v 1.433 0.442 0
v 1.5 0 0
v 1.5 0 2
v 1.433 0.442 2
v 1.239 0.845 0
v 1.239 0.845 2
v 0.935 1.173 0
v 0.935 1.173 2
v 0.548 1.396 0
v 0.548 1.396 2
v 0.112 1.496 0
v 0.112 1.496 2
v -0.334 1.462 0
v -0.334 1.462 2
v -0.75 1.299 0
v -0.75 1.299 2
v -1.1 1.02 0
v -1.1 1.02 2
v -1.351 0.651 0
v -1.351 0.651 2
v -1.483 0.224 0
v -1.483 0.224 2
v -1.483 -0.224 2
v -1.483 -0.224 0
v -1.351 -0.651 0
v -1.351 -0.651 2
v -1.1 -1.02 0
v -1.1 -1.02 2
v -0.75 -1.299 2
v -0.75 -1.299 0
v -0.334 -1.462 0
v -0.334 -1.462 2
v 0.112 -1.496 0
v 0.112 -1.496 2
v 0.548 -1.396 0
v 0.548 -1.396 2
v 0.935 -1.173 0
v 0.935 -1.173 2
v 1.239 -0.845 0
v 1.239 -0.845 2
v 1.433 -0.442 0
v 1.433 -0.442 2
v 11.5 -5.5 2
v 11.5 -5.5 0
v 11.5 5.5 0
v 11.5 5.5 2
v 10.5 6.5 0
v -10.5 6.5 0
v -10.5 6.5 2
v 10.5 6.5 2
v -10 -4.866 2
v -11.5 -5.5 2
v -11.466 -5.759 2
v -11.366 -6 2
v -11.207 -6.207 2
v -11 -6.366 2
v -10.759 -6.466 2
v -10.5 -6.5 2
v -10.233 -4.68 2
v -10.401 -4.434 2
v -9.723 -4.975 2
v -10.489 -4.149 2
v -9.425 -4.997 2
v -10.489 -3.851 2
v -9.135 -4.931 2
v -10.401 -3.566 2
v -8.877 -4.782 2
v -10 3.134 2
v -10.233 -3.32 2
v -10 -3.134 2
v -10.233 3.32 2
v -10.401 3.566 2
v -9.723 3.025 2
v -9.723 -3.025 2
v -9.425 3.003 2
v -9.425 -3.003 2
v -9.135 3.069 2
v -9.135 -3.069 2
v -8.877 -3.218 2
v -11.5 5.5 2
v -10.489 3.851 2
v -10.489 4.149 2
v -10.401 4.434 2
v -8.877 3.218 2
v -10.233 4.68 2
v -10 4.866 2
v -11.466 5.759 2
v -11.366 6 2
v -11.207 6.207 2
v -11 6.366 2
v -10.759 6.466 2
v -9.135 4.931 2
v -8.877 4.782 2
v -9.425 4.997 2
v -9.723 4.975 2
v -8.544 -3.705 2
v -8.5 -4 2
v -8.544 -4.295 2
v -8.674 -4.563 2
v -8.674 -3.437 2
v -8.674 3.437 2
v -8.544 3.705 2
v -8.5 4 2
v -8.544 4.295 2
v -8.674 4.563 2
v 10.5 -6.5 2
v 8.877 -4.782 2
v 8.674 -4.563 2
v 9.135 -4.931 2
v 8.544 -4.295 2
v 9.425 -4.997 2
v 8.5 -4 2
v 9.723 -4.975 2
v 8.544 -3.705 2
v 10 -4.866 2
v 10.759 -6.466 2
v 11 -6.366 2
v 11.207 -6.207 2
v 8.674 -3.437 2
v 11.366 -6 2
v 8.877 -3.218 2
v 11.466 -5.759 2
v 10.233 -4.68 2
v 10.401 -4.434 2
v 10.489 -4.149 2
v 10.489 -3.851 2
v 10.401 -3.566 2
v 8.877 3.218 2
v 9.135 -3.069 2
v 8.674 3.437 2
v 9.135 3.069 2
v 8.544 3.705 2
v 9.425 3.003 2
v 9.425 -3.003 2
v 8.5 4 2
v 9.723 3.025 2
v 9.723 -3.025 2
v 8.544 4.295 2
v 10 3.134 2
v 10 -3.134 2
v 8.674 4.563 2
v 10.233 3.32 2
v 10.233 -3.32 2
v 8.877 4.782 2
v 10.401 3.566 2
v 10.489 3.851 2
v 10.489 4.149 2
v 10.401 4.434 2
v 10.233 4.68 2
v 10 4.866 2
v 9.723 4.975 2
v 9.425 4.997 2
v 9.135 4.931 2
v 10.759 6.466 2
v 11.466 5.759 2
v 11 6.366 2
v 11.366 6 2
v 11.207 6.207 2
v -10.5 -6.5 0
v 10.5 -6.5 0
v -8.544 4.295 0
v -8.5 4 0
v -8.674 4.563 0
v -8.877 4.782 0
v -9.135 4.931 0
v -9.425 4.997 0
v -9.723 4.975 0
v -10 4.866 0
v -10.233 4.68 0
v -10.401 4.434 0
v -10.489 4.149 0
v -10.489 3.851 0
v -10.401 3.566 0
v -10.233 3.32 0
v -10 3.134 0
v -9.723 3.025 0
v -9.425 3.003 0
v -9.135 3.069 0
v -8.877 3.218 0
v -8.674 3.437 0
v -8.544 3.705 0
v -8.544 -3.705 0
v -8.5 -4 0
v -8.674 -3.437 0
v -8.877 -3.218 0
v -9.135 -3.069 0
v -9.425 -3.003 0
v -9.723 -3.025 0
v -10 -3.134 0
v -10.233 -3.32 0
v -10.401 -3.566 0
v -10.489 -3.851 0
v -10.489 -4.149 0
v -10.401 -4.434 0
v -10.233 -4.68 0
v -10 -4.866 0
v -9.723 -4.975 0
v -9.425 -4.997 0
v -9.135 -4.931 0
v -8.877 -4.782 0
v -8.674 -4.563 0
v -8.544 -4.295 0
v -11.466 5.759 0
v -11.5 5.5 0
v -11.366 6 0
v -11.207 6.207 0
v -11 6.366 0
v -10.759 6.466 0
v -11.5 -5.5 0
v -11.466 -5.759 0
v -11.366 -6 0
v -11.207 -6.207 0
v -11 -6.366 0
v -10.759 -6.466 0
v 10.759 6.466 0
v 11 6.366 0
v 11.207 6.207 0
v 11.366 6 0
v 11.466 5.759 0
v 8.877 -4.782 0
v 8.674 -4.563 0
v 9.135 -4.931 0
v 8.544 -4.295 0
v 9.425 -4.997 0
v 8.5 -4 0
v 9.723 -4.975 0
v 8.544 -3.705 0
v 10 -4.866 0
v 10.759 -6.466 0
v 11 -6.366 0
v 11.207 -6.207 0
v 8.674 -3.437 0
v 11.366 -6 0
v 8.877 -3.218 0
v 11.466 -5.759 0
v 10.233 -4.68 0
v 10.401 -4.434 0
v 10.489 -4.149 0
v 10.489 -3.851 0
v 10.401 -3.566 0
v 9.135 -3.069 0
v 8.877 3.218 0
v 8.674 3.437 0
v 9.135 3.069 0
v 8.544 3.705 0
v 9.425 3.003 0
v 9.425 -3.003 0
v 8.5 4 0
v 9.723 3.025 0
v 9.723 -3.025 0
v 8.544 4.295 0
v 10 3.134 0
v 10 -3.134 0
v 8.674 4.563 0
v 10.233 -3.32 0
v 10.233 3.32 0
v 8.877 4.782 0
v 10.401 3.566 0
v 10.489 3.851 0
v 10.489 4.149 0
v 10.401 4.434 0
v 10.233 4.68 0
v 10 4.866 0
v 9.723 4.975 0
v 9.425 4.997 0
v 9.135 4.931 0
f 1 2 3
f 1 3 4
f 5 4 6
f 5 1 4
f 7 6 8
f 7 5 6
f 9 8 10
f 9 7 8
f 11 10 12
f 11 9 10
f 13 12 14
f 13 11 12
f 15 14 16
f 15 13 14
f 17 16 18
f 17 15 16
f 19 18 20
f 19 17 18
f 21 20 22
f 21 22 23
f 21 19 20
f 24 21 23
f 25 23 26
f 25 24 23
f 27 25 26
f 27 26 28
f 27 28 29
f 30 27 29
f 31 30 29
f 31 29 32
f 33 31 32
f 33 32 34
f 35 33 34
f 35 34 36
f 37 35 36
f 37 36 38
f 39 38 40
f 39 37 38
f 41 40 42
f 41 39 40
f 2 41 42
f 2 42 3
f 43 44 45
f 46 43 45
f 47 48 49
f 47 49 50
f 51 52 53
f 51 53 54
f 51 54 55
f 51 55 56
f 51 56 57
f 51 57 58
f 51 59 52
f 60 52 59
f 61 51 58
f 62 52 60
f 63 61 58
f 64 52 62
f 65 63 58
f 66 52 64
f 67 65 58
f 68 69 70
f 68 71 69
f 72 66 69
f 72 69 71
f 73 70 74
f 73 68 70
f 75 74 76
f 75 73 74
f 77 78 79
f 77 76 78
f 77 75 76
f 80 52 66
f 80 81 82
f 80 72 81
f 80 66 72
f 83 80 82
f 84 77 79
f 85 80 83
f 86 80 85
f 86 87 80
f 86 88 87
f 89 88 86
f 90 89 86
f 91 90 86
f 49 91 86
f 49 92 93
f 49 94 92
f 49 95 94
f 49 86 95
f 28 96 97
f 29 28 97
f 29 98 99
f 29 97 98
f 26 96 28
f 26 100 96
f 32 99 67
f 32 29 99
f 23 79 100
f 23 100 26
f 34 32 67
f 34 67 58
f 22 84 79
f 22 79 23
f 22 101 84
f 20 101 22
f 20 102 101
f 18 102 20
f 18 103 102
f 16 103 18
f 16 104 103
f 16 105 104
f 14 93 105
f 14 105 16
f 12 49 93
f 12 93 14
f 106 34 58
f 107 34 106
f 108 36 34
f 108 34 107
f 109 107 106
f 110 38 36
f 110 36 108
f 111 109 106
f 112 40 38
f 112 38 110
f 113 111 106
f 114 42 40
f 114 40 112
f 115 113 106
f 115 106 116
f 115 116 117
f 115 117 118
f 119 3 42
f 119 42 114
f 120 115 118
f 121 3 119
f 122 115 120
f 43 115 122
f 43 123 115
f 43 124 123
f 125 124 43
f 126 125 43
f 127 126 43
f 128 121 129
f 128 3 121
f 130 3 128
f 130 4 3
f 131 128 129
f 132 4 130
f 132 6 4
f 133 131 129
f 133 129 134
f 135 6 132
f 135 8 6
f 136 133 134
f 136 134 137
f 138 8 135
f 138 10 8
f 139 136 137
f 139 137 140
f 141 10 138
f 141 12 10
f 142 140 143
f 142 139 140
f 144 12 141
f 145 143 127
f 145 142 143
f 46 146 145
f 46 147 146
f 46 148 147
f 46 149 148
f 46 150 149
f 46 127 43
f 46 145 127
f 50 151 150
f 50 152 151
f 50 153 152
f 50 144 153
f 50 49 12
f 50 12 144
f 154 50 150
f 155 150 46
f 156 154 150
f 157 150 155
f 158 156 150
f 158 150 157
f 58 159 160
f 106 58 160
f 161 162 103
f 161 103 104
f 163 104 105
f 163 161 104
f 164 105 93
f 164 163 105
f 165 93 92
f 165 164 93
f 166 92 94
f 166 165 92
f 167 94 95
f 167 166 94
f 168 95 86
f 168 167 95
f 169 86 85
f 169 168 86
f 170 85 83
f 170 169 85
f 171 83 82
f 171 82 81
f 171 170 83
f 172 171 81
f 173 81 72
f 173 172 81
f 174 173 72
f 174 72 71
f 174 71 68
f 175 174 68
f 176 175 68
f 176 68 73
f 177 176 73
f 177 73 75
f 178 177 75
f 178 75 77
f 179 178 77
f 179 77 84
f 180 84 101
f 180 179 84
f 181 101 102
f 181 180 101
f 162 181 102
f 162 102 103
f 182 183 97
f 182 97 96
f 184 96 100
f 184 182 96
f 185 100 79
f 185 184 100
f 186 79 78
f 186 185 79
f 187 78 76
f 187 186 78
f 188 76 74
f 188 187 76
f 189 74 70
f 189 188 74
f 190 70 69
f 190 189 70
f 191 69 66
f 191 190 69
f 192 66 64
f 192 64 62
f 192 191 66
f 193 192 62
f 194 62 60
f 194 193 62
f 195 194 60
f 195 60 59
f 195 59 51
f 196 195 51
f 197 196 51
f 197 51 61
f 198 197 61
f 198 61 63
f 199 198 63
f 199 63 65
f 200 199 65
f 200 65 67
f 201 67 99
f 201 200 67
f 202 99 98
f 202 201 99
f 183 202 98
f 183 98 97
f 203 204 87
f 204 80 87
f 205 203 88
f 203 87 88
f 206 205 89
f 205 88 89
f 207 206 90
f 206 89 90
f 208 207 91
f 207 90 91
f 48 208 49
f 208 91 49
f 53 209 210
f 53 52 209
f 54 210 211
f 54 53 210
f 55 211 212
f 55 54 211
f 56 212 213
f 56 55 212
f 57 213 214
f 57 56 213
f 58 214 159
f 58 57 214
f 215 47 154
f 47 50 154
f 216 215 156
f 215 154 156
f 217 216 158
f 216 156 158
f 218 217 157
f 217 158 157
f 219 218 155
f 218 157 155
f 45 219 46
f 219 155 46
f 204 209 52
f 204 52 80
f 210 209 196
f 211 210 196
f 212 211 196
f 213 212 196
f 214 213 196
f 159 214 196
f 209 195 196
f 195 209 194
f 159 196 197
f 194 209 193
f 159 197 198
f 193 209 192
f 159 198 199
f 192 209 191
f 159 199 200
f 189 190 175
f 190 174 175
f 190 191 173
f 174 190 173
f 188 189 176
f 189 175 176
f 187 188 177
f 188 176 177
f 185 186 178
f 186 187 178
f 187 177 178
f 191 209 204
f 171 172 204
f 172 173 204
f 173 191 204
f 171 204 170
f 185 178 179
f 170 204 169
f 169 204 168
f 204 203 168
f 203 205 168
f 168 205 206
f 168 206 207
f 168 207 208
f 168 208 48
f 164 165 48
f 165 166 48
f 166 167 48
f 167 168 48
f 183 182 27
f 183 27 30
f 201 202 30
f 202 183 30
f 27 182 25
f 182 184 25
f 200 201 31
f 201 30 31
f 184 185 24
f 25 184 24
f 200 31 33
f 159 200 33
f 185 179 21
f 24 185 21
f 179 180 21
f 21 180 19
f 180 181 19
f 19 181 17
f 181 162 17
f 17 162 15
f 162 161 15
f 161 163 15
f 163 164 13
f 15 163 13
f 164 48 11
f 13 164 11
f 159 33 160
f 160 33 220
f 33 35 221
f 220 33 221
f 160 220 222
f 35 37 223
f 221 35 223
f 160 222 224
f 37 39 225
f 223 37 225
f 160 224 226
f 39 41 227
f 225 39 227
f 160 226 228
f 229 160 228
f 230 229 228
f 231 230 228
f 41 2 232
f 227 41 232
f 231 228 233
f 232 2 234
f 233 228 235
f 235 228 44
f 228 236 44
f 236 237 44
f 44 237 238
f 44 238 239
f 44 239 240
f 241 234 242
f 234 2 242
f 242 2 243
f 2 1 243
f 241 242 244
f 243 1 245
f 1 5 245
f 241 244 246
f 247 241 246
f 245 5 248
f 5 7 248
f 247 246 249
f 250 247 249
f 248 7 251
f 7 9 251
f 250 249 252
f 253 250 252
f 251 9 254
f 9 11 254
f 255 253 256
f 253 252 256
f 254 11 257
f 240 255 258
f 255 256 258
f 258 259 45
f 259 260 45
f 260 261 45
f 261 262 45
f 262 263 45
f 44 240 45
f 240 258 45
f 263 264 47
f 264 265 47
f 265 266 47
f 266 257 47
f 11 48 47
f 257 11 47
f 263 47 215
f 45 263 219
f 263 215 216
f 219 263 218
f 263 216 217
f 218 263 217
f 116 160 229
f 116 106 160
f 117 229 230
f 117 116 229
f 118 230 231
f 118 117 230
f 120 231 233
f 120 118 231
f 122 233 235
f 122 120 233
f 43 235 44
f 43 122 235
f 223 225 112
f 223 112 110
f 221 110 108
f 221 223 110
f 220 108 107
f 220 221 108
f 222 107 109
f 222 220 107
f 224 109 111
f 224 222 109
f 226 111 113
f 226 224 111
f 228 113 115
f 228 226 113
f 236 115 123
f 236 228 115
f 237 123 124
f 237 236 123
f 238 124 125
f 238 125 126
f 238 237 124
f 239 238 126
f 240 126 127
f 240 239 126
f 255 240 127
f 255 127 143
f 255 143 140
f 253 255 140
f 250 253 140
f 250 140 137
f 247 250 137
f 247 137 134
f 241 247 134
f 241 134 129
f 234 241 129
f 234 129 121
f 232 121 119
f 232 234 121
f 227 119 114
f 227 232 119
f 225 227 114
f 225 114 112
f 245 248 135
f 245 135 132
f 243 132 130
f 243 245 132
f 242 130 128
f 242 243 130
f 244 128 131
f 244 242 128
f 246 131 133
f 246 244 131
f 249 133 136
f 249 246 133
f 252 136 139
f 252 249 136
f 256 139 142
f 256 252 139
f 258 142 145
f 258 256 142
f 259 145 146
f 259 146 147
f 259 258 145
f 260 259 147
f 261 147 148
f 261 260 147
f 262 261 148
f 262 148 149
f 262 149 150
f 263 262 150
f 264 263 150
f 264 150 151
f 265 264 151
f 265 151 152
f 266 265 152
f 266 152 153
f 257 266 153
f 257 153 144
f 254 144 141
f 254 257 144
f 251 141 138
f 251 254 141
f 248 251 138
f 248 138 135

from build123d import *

# Parameters (mm, degrees)
SKETCH_1_W      = 23
SKETCH_1_H      = 13
SKETCH_1_R      = 1
SKETCH_1_R_2    = 1.5
EXTRUDE_1_DEPTH = 2
FILLET_1_R      = 1


with BuildPart() as part:
    # 草图1 → 凸台-拉伸1 (new body)
    with BuildSketch(Plane.XY):
        Rectangle(SKETCH_1_W, SKETCH_1_H)
        with Locations((-9.5, 4)):
            Circle(SKETCH_1_R, mode=Mode.SUBTRACT)
        with Locations((-9.5, -4)):
            Circle(SKETCH_1_R, mode=Mode.SUBTRACT)
        with Locations(Location((9.5, -4, 0), (0, 0, 180))):
            Circle(SKETCH_1_R, mode=Mode.SUBTRACT)
        with Locations(Location((9.5, 4, 0), (0, 0, 180))):
            Circle(SKETCH_1_R, mode=Mode.SUBTRACT)
        Circle(SKETCH_1_R_2, mode=Mode.SUBTRACT)
    extrude(amount=EXTRUDE_1_DEPTH)

    # 圆角1
    fillet_1_edges = [part.edges().sort_by_distance(p)[0] for p in [
        (11.5, -6.5, 1),
        (-11.5, -6.5, 1),
        (-11.5, 6.5, 1),
        (11.5, 6.5, 1),
    ]]
    fillet(fillet_1_edges, radius=FILLET_1_R)


solid = part.part
